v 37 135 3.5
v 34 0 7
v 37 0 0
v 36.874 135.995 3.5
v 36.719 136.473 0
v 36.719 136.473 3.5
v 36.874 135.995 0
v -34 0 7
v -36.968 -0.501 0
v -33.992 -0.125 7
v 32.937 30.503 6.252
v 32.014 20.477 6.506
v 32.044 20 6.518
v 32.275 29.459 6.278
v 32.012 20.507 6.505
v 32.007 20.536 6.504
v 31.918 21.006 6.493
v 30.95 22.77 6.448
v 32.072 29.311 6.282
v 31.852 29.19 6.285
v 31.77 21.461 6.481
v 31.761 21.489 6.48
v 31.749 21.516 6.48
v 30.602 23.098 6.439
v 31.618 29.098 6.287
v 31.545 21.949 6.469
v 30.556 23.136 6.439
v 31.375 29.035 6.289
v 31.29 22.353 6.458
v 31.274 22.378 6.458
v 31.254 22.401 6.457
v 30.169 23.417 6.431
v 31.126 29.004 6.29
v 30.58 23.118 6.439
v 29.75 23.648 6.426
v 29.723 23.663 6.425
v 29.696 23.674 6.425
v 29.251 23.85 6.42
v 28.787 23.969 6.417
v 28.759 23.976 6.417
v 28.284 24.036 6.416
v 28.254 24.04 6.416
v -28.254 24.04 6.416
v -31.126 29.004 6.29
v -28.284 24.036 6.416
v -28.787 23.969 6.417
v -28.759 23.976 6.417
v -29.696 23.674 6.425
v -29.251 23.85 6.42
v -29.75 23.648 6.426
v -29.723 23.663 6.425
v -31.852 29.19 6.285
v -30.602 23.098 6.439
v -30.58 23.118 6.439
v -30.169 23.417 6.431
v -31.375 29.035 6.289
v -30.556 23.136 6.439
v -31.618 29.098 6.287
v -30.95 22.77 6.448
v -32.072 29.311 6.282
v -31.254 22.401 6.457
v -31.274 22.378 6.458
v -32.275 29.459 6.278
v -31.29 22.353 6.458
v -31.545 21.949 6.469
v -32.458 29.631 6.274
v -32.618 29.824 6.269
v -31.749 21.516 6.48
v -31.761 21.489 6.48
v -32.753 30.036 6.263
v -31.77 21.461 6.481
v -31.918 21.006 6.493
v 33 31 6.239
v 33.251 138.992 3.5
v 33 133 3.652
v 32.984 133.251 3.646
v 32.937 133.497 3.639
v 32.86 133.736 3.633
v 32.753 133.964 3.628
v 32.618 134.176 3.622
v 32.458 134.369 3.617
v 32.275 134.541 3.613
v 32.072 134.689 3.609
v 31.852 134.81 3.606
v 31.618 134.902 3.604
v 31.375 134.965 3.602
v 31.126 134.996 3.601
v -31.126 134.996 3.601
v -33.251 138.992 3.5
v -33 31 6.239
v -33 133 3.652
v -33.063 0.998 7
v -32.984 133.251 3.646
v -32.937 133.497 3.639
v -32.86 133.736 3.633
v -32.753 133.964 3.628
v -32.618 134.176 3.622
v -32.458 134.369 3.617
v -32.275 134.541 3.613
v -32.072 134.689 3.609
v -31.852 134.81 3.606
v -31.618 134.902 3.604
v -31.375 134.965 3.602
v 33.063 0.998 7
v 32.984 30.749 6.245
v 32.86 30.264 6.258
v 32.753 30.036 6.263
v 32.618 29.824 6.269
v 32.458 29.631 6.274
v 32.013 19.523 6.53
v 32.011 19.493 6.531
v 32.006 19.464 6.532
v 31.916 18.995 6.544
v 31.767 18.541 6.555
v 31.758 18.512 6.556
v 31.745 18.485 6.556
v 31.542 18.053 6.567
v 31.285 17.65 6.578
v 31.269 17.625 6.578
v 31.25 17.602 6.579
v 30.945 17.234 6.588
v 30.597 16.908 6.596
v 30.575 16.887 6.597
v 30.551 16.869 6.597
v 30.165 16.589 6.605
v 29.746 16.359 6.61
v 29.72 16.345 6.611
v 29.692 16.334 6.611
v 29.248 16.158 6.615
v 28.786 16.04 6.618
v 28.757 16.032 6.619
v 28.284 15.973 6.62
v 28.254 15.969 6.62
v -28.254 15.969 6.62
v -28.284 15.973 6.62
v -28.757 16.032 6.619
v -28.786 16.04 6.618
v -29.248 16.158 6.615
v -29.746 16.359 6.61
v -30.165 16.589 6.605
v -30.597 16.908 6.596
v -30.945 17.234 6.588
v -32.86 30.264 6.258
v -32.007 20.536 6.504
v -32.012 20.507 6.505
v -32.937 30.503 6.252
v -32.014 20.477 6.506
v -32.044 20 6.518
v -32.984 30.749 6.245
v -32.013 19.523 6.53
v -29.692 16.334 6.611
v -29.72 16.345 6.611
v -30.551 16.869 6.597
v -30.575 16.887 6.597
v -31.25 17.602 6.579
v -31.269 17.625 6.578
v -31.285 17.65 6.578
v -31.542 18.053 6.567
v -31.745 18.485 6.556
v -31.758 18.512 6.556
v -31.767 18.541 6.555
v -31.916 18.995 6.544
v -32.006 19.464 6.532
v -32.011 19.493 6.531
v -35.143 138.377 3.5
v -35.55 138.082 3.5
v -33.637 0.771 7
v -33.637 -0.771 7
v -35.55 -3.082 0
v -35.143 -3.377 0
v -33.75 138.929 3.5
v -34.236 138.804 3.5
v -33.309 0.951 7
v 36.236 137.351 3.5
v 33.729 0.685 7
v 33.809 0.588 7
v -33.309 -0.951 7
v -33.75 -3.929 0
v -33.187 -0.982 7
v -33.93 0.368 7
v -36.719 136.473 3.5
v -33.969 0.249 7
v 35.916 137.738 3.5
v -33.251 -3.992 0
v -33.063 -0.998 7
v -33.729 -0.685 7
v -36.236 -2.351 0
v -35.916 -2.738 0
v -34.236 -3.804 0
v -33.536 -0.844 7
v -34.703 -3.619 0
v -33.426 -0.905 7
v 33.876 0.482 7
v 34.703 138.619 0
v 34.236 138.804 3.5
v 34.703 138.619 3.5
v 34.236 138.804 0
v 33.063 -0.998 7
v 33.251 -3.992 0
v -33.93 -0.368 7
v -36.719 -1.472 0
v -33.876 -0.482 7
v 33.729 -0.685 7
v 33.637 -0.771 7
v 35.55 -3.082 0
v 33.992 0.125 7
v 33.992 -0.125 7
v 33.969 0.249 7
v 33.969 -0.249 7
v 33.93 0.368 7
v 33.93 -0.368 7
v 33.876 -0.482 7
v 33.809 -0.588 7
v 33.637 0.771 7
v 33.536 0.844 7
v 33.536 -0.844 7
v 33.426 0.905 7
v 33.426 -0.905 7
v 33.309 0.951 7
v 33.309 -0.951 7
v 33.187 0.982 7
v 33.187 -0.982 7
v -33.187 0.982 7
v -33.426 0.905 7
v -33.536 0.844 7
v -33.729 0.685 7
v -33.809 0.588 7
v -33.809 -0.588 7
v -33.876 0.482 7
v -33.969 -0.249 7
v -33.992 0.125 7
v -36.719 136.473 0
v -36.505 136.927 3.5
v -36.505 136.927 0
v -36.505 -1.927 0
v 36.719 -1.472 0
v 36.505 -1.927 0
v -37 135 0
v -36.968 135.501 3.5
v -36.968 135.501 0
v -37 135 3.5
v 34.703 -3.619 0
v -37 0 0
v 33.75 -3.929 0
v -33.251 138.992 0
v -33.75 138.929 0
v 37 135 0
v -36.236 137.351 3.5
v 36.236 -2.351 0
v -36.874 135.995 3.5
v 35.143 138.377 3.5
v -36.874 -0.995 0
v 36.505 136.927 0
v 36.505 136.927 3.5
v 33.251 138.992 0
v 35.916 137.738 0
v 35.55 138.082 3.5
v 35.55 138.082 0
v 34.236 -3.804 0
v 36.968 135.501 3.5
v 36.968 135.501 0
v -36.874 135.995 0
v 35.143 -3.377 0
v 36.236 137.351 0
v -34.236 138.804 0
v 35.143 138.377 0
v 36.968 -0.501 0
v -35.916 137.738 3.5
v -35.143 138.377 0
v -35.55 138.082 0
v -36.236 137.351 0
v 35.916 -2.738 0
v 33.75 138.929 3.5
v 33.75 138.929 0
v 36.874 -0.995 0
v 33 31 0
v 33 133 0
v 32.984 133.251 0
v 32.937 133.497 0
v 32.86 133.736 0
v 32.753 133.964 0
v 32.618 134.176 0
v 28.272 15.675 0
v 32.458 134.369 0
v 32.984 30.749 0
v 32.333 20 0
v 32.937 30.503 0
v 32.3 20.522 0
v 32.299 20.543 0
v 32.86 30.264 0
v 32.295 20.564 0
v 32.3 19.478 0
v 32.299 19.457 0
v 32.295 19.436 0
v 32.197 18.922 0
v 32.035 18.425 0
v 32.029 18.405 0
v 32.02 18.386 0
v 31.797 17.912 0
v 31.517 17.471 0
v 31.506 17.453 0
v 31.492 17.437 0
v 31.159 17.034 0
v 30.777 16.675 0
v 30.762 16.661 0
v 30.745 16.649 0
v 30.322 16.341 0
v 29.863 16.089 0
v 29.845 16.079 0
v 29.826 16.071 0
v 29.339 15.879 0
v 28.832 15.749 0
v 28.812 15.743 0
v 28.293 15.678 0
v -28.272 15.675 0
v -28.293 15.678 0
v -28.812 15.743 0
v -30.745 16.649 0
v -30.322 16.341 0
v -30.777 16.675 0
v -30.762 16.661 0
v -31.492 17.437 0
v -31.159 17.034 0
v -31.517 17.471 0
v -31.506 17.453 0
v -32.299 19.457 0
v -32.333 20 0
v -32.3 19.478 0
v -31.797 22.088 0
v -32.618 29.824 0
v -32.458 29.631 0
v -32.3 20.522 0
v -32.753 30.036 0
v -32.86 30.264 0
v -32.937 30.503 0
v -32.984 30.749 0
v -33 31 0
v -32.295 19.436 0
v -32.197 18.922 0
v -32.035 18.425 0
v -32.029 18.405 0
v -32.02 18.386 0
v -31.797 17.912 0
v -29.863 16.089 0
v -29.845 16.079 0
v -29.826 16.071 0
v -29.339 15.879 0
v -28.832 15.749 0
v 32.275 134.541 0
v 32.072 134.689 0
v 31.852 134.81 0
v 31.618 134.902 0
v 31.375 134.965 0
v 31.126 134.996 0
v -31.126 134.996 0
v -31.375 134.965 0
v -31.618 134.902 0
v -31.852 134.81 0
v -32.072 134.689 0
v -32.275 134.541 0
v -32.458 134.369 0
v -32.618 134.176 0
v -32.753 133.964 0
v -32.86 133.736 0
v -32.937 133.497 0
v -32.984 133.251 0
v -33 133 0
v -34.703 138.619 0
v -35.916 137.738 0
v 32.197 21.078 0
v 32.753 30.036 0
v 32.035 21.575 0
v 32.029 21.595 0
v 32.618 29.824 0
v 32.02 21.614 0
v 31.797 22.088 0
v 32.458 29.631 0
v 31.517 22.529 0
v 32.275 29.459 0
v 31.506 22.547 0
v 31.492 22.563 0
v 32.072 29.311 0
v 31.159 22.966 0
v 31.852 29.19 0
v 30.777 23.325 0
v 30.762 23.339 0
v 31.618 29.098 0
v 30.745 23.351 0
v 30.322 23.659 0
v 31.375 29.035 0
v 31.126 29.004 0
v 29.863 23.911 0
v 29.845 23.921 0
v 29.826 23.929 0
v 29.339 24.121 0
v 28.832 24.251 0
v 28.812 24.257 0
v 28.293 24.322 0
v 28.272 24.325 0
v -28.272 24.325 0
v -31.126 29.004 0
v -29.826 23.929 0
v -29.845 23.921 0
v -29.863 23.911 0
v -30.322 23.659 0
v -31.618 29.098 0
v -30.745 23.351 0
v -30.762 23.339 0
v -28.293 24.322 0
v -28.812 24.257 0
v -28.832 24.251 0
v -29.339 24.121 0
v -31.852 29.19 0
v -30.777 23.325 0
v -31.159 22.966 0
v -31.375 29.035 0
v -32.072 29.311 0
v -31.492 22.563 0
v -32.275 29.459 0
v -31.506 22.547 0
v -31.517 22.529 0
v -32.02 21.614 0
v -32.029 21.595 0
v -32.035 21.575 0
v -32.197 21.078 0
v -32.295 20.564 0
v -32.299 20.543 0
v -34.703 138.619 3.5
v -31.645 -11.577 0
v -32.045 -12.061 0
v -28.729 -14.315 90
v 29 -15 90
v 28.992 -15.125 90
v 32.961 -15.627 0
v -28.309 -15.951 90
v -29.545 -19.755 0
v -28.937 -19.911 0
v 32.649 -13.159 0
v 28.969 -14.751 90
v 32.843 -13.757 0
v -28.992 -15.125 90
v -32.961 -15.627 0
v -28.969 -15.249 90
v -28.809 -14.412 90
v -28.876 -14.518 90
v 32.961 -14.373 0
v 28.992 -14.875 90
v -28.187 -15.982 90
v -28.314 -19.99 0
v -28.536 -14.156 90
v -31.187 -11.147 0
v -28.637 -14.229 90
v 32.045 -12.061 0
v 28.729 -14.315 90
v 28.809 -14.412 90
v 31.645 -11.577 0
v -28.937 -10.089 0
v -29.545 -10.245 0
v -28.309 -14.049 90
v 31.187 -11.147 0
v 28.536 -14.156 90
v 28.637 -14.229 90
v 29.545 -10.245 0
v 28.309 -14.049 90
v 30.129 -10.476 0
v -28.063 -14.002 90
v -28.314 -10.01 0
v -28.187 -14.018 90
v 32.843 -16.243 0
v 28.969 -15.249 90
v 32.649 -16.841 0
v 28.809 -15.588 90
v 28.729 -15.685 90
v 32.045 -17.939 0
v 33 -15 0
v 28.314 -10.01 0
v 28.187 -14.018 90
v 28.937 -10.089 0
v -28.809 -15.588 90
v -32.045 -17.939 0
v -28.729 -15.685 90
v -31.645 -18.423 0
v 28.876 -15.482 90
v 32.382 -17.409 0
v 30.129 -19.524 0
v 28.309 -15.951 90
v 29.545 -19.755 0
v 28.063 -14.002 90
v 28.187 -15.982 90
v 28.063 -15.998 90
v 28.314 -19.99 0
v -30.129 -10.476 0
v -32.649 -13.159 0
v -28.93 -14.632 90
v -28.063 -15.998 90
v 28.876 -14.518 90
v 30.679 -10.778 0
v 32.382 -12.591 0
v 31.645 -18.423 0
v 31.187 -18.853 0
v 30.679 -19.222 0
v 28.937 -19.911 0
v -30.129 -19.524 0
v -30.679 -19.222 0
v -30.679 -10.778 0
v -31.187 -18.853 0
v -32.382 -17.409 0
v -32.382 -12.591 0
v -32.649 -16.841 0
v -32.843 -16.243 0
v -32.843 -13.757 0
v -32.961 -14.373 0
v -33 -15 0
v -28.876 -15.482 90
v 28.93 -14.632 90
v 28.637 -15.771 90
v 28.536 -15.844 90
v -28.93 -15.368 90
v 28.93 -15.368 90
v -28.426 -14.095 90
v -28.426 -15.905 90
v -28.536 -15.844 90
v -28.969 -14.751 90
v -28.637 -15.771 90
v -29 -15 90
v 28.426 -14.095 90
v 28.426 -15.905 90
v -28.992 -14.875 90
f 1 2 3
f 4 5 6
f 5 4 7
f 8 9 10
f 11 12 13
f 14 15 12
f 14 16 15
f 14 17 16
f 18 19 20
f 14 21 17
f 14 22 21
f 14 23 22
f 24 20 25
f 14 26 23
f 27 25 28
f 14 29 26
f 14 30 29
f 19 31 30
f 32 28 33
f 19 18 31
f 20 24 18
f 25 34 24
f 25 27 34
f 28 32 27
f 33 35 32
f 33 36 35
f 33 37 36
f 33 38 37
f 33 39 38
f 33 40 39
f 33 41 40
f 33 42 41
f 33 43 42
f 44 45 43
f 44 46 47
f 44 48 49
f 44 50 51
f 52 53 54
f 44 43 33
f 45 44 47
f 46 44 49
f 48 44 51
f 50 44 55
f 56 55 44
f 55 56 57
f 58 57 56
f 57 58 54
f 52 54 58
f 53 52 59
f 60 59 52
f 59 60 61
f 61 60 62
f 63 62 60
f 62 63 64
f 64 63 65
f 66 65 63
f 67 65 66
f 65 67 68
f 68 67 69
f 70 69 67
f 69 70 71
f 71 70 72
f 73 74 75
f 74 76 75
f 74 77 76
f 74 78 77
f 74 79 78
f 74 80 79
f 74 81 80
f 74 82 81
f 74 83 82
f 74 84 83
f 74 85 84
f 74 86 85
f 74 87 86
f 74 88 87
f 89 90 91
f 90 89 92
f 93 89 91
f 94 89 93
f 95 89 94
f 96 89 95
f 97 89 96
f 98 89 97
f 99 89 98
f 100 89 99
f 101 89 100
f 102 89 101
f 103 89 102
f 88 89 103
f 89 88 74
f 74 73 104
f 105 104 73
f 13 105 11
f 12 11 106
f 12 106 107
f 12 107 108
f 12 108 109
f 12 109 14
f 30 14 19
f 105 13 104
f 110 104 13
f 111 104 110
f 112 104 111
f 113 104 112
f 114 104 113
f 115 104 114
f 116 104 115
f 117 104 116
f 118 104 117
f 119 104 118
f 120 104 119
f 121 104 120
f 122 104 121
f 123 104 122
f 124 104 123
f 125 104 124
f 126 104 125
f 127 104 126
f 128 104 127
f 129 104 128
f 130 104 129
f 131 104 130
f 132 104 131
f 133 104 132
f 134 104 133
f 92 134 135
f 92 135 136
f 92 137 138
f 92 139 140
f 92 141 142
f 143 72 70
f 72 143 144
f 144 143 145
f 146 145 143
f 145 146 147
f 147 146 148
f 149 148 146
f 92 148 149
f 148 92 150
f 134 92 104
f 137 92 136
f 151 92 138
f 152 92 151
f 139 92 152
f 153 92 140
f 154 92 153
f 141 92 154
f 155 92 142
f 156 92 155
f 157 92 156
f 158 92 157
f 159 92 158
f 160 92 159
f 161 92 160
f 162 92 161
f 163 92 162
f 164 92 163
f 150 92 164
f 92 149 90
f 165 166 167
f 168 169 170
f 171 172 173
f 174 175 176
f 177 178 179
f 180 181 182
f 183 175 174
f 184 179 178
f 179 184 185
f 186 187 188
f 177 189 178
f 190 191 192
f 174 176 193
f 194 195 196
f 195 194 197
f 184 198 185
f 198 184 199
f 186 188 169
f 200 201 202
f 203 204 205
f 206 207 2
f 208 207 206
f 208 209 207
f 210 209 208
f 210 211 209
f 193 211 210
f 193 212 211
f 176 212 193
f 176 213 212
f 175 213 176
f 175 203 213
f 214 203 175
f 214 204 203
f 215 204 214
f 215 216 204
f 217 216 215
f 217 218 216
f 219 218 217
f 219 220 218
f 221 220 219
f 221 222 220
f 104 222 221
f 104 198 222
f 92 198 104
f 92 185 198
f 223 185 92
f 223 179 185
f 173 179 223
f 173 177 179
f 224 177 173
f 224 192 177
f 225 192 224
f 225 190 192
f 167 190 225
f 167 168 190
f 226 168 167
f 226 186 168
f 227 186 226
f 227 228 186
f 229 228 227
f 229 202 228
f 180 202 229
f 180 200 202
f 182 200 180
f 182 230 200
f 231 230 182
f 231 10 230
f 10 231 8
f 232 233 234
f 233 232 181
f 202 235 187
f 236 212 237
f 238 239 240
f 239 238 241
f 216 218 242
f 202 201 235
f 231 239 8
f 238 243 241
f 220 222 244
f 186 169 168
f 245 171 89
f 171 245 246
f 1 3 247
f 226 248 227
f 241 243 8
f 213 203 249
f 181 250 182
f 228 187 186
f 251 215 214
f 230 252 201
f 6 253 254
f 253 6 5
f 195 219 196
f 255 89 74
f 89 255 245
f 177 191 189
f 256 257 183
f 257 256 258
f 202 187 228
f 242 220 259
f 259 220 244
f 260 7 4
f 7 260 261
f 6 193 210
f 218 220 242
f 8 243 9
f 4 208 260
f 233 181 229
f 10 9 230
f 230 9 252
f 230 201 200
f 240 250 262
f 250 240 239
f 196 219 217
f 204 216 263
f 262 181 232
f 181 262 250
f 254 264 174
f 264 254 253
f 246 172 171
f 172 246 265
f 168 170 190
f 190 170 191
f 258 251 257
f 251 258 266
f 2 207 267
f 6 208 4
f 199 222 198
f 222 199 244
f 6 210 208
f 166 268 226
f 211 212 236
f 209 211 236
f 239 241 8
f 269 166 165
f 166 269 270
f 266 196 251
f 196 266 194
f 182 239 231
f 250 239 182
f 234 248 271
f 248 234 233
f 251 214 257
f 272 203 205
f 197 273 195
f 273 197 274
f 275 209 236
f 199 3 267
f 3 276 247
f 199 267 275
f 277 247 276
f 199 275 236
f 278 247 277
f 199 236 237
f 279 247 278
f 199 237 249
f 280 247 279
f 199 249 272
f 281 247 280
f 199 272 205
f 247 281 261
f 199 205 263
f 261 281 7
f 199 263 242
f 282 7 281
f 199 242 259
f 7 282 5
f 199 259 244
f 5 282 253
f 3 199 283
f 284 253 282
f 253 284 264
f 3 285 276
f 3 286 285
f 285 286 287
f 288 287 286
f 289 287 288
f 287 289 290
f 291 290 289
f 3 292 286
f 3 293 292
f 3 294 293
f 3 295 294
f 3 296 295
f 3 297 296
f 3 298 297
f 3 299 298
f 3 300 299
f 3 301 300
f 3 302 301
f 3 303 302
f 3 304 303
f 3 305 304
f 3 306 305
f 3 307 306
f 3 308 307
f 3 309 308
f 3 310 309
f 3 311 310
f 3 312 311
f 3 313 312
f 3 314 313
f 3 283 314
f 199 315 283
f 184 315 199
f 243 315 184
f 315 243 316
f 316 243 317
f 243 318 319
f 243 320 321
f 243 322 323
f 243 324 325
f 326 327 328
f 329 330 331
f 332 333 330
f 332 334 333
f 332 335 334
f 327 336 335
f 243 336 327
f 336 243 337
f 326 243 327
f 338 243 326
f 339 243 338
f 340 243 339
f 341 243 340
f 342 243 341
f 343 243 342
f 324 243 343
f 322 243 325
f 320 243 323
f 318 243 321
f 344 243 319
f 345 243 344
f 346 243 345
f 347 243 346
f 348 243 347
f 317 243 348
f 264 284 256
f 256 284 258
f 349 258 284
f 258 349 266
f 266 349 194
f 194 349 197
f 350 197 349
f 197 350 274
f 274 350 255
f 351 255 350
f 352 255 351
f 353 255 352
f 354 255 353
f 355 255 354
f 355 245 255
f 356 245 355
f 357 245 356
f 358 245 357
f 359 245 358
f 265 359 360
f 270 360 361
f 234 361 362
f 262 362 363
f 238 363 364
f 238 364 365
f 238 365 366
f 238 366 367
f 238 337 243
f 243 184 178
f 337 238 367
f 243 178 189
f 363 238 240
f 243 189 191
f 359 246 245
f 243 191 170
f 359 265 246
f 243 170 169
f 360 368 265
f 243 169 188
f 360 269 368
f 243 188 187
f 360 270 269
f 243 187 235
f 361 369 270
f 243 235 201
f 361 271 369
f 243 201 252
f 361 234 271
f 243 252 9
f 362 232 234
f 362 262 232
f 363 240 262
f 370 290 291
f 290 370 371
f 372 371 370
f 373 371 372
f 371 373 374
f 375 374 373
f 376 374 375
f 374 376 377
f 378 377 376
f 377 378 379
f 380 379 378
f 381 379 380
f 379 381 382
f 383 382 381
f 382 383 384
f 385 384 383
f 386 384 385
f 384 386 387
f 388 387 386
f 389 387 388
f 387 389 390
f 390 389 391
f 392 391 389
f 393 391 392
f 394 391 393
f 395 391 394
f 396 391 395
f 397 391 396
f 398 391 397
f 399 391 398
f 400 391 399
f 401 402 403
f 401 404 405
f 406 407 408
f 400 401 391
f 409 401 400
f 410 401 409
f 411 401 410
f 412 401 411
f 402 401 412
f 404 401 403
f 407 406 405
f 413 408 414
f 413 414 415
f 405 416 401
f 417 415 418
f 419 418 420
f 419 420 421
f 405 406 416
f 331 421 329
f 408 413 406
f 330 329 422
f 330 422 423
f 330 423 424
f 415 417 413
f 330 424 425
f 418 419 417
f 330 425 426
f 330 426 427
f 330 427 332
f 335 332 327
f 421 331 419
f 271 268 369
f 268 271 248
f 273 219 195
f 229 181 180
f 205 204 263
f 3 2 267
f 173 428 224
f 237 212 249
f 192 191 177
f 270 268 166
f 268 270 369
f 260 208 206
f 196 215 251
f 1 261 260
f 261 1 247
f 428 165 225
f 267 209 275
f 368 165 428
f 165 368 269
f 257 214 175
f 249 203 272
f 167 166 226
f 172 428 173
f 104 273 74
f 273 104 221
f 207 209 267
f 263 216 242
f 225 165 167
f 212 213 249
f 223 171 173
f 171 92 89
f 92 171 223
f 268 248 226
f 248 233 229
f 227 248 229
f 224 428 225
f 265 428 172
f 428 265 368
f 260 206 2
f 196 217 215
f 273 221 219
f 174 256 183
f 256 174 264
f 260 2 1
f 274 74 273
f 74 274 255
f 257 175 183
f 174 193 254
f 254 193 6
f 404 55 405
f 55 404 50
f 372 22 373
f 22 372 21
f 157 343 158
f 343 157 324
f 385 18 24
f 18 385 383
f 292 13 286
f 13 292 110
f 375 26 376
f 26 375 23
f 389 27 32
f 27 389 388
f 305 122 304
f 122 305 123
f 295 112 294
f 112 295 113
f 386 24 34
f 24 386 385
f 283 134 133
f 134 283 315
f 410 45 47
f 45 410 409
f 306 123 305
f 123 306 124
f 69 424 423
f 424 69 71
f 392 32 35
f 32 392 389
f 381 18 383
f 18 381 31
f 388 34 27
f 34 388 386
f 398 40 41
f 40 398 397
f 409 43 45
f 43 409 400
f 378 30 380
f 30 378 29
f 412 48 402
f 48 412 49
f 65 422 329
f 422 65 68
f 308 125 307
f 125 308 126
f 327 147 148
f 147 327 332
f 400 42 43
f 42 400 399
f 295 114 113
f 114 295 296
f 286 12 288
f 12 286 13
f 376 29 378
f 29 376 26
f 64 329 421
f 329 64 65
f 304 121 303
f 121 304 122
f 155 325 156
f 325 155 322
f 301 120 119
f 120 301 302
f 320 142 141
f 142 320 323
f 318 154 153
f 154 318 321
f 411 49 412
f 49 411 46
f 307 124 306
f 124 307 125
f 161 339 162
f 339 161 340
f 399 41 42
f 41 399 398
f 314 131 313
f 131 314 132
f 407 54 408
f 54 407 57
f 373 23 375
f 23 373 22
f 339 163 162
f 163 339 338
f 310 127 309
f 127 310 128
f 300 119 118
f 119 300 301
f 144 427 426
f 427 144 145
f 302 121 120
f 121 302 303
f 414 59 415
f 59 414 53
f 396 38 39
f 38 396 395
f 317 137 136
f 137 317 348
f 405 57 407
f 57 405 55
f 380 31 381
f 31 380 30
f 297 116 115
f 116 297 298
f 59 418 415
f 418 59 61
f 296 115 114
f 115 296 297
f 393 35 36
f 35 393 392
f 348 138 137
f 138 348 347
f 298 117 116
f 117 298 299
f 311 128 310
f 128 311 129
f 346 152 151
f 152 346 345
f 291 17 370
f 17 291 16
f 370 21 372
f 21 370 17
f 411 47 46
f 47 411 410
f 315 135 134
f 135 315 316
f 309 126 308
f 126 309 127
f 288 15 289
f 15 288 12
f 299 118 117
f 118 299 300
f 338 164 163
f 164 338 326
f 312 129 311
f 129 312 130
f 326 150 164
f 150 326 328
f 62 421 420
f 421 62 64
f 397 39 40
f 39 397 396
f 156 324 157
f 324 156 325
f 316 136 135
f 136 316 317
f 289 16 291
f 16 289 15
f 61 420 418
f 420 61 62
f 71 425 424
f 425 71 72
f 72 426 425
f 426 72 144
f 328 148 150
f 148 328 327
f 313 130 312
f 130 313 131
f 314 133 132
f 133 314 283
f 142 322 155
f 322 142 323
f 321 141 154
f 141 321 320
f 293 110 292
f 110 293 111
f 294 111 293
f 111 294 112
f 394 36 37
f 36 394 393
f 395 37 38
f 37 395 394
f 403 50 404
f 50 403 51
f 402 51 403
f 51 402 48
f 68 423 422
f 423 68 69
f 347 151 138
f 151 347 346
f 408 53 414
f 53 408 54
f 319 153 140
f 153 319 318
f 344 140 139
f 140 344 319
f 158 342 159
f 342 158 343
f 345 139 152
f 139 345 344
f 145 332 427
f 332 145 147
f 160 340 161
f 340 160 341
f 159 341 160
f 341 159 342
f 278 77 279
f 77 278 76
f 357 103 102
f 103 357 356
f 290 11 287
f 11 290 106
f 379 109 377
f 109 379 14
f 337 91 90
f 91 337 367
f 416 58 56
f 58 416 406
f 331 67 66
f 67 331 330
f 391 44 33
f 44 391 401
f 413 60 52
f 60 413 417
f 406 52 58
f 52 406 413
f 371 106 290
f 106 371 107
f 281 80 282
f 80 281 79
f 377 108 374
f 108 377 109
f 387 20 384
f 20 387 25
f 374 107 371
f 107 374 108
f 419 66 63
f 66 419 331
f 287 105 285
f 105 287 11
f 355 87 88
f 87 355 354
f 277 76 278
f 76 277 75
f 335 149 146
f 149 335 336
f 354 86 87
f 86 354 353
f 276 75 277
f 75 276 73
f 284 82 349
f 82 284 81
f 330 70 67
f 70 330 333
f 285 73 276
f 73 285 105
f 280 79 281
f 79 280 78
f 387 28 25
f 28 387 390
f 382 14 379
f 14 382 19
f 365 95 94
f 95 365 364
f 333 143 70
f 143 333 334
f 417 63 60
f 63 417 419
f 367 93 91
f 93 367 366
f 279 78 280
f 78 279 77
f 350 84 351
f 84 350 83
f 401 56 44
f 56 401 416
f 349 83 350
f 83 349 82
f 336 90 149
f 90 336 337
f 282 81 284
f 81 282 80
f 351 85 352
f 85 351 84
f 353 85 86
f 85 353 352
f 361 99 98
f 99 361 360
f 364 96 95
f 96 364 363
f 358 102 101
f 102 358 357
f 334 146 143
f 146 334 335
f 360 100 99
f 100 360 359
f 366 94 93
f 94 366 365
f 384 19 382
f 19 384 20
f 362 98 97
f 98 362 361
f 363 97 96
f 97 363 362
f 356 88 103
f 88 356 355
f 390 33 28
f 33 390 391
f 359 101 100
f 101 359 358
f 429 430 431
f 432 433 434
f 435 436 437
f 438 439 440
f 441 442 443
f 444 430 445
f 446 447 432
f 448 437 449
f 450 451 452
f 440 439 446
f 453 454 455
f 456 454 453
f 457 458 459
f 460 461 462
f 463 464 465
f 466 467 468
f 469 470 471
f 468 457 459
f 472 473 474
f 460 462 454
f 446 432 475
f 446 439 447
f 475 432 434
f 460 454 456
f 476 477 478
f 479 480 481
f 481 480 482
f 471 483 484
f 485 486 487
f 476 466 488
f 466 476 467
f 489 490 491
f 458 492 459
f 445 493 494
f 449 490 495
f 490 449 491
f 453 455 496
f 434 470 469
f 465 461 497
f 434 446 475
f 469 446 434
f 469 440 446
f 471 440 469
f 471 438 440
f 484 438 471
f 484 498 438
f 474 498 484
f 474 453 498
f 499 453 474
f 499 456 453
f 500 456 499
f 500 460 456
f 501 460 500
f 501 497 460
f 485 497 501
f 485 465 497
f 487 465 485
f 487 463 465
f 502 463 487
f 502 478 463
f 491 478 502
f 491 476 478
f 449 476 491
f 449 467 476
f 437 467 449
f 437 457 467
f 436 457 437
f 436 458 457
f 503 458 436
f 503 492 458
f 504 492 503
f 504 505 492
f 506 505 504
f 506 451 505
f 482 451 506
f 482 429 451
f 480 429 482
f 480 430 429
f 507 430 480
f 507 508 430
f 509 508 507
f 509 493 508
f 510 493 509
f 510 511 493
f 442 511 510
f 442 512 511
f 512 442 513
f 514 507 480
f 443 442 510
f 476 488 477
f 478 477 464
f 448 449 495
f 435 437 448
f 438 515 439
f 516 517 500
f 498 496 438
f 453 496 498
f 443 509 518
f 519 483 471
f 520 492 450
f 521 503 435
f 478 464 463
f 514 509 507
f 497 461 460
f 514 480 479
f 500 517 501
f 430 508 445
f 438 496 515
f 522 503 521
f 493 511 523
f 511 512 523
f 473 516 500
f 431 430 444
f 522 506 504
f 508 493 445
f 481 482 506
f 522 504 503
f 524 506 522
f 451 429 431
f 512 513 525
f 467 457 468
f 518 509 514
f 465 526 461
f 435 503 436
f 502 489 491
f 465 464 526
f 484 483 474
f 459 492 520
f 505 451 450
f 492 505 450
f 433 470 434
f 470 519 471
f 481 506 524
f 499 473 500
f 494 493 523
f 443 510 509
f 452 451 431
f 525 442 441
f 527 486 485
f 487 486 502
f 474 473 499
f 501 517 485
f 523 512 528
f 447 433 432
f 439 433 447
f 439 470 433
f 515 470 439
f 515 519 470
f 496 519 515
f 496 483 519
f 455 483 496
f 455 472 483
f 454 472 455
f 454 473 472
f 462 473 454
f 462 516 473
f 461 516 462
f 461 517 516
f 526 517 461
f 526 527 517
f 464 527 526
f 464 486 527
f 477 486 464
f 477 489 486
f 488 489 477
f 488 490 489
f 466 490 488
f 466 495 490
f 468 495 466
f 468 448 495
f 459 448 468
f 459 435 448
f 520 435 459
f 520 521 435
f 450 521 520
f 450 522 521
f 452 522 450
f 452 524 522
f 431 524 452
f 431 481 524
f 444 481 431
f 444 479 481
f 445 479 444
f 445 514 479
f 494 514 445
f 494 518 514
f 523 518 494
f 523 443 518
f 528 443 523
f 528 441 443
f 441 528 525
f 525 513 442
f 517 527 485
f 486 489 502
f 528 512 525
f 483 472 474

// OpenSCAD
// Width
width=66;

// Height
height=115;

// Depth
depth=7;

// Solid Body
solidB=false;

// Solid Foot
solidF=true;

//[Hidden]
flong=90;
ftall=20;

module base(){
	ww=(width/2)-2;
	hh=height+ftall-2;
	difference(){
		hull(){
			translate([-width/2,height+ftall,0])
			cylinder(h=depth/2,r=4,$fn=50);
			translate([width/2,height+ftall,0])
			cylinder(h=depth/2,r=4,$fn=50);
			translate([-width/2,0,0])
			cylinder(h=depth,r1=4,r2=1,$fn=50);
			translate([width/2,0,0])
			cylinder(h=depth,r1=4,r2=1,$fn=50);
		}
		pie(ftall,-15);
		if (!solidF)
			hull(){
				translate([-ww,ftall-11,0])
				cylinder(h=depth,r=2,$fn=50);
				translate([ww,ftall-11,0])
				cylinder(h=depth,r=2,$fn=50);
				translate([-ww,2,0])
				cylinder(h=depth,r=2,$fn=50);
				translate([ww,2,0])
				cylinder(h=depth,r=2,$fn=50);
			}
		if (!solidB)
			hull(){
				translate([-ww,ftall+11,0])
				cylinder(h=depth,r=2,$fn=50);
				translate([ww,ftall+11,0])
				cylinder(h=depth,r=2,$fn=50);
				translate([-ww,hh,0])
				cylinder(h=depth,r=2,$fn=50);
				translate([ww,hh,0])
				cylinder(h=depth,r=2,$fn=50);
			}
		
	}
}

module pie(hh,z){
	ww=(width/2)-5;
	hull(){
	translate([-ww,hh,z])
	cylinder(h=flong,r1=5,r2=1,$fn=50);
	translate([ww,hh,z])
	cylinder(h=flong,r1=5,r2=1,$fn=50);
	}
}

base();
pie(-15,0);
